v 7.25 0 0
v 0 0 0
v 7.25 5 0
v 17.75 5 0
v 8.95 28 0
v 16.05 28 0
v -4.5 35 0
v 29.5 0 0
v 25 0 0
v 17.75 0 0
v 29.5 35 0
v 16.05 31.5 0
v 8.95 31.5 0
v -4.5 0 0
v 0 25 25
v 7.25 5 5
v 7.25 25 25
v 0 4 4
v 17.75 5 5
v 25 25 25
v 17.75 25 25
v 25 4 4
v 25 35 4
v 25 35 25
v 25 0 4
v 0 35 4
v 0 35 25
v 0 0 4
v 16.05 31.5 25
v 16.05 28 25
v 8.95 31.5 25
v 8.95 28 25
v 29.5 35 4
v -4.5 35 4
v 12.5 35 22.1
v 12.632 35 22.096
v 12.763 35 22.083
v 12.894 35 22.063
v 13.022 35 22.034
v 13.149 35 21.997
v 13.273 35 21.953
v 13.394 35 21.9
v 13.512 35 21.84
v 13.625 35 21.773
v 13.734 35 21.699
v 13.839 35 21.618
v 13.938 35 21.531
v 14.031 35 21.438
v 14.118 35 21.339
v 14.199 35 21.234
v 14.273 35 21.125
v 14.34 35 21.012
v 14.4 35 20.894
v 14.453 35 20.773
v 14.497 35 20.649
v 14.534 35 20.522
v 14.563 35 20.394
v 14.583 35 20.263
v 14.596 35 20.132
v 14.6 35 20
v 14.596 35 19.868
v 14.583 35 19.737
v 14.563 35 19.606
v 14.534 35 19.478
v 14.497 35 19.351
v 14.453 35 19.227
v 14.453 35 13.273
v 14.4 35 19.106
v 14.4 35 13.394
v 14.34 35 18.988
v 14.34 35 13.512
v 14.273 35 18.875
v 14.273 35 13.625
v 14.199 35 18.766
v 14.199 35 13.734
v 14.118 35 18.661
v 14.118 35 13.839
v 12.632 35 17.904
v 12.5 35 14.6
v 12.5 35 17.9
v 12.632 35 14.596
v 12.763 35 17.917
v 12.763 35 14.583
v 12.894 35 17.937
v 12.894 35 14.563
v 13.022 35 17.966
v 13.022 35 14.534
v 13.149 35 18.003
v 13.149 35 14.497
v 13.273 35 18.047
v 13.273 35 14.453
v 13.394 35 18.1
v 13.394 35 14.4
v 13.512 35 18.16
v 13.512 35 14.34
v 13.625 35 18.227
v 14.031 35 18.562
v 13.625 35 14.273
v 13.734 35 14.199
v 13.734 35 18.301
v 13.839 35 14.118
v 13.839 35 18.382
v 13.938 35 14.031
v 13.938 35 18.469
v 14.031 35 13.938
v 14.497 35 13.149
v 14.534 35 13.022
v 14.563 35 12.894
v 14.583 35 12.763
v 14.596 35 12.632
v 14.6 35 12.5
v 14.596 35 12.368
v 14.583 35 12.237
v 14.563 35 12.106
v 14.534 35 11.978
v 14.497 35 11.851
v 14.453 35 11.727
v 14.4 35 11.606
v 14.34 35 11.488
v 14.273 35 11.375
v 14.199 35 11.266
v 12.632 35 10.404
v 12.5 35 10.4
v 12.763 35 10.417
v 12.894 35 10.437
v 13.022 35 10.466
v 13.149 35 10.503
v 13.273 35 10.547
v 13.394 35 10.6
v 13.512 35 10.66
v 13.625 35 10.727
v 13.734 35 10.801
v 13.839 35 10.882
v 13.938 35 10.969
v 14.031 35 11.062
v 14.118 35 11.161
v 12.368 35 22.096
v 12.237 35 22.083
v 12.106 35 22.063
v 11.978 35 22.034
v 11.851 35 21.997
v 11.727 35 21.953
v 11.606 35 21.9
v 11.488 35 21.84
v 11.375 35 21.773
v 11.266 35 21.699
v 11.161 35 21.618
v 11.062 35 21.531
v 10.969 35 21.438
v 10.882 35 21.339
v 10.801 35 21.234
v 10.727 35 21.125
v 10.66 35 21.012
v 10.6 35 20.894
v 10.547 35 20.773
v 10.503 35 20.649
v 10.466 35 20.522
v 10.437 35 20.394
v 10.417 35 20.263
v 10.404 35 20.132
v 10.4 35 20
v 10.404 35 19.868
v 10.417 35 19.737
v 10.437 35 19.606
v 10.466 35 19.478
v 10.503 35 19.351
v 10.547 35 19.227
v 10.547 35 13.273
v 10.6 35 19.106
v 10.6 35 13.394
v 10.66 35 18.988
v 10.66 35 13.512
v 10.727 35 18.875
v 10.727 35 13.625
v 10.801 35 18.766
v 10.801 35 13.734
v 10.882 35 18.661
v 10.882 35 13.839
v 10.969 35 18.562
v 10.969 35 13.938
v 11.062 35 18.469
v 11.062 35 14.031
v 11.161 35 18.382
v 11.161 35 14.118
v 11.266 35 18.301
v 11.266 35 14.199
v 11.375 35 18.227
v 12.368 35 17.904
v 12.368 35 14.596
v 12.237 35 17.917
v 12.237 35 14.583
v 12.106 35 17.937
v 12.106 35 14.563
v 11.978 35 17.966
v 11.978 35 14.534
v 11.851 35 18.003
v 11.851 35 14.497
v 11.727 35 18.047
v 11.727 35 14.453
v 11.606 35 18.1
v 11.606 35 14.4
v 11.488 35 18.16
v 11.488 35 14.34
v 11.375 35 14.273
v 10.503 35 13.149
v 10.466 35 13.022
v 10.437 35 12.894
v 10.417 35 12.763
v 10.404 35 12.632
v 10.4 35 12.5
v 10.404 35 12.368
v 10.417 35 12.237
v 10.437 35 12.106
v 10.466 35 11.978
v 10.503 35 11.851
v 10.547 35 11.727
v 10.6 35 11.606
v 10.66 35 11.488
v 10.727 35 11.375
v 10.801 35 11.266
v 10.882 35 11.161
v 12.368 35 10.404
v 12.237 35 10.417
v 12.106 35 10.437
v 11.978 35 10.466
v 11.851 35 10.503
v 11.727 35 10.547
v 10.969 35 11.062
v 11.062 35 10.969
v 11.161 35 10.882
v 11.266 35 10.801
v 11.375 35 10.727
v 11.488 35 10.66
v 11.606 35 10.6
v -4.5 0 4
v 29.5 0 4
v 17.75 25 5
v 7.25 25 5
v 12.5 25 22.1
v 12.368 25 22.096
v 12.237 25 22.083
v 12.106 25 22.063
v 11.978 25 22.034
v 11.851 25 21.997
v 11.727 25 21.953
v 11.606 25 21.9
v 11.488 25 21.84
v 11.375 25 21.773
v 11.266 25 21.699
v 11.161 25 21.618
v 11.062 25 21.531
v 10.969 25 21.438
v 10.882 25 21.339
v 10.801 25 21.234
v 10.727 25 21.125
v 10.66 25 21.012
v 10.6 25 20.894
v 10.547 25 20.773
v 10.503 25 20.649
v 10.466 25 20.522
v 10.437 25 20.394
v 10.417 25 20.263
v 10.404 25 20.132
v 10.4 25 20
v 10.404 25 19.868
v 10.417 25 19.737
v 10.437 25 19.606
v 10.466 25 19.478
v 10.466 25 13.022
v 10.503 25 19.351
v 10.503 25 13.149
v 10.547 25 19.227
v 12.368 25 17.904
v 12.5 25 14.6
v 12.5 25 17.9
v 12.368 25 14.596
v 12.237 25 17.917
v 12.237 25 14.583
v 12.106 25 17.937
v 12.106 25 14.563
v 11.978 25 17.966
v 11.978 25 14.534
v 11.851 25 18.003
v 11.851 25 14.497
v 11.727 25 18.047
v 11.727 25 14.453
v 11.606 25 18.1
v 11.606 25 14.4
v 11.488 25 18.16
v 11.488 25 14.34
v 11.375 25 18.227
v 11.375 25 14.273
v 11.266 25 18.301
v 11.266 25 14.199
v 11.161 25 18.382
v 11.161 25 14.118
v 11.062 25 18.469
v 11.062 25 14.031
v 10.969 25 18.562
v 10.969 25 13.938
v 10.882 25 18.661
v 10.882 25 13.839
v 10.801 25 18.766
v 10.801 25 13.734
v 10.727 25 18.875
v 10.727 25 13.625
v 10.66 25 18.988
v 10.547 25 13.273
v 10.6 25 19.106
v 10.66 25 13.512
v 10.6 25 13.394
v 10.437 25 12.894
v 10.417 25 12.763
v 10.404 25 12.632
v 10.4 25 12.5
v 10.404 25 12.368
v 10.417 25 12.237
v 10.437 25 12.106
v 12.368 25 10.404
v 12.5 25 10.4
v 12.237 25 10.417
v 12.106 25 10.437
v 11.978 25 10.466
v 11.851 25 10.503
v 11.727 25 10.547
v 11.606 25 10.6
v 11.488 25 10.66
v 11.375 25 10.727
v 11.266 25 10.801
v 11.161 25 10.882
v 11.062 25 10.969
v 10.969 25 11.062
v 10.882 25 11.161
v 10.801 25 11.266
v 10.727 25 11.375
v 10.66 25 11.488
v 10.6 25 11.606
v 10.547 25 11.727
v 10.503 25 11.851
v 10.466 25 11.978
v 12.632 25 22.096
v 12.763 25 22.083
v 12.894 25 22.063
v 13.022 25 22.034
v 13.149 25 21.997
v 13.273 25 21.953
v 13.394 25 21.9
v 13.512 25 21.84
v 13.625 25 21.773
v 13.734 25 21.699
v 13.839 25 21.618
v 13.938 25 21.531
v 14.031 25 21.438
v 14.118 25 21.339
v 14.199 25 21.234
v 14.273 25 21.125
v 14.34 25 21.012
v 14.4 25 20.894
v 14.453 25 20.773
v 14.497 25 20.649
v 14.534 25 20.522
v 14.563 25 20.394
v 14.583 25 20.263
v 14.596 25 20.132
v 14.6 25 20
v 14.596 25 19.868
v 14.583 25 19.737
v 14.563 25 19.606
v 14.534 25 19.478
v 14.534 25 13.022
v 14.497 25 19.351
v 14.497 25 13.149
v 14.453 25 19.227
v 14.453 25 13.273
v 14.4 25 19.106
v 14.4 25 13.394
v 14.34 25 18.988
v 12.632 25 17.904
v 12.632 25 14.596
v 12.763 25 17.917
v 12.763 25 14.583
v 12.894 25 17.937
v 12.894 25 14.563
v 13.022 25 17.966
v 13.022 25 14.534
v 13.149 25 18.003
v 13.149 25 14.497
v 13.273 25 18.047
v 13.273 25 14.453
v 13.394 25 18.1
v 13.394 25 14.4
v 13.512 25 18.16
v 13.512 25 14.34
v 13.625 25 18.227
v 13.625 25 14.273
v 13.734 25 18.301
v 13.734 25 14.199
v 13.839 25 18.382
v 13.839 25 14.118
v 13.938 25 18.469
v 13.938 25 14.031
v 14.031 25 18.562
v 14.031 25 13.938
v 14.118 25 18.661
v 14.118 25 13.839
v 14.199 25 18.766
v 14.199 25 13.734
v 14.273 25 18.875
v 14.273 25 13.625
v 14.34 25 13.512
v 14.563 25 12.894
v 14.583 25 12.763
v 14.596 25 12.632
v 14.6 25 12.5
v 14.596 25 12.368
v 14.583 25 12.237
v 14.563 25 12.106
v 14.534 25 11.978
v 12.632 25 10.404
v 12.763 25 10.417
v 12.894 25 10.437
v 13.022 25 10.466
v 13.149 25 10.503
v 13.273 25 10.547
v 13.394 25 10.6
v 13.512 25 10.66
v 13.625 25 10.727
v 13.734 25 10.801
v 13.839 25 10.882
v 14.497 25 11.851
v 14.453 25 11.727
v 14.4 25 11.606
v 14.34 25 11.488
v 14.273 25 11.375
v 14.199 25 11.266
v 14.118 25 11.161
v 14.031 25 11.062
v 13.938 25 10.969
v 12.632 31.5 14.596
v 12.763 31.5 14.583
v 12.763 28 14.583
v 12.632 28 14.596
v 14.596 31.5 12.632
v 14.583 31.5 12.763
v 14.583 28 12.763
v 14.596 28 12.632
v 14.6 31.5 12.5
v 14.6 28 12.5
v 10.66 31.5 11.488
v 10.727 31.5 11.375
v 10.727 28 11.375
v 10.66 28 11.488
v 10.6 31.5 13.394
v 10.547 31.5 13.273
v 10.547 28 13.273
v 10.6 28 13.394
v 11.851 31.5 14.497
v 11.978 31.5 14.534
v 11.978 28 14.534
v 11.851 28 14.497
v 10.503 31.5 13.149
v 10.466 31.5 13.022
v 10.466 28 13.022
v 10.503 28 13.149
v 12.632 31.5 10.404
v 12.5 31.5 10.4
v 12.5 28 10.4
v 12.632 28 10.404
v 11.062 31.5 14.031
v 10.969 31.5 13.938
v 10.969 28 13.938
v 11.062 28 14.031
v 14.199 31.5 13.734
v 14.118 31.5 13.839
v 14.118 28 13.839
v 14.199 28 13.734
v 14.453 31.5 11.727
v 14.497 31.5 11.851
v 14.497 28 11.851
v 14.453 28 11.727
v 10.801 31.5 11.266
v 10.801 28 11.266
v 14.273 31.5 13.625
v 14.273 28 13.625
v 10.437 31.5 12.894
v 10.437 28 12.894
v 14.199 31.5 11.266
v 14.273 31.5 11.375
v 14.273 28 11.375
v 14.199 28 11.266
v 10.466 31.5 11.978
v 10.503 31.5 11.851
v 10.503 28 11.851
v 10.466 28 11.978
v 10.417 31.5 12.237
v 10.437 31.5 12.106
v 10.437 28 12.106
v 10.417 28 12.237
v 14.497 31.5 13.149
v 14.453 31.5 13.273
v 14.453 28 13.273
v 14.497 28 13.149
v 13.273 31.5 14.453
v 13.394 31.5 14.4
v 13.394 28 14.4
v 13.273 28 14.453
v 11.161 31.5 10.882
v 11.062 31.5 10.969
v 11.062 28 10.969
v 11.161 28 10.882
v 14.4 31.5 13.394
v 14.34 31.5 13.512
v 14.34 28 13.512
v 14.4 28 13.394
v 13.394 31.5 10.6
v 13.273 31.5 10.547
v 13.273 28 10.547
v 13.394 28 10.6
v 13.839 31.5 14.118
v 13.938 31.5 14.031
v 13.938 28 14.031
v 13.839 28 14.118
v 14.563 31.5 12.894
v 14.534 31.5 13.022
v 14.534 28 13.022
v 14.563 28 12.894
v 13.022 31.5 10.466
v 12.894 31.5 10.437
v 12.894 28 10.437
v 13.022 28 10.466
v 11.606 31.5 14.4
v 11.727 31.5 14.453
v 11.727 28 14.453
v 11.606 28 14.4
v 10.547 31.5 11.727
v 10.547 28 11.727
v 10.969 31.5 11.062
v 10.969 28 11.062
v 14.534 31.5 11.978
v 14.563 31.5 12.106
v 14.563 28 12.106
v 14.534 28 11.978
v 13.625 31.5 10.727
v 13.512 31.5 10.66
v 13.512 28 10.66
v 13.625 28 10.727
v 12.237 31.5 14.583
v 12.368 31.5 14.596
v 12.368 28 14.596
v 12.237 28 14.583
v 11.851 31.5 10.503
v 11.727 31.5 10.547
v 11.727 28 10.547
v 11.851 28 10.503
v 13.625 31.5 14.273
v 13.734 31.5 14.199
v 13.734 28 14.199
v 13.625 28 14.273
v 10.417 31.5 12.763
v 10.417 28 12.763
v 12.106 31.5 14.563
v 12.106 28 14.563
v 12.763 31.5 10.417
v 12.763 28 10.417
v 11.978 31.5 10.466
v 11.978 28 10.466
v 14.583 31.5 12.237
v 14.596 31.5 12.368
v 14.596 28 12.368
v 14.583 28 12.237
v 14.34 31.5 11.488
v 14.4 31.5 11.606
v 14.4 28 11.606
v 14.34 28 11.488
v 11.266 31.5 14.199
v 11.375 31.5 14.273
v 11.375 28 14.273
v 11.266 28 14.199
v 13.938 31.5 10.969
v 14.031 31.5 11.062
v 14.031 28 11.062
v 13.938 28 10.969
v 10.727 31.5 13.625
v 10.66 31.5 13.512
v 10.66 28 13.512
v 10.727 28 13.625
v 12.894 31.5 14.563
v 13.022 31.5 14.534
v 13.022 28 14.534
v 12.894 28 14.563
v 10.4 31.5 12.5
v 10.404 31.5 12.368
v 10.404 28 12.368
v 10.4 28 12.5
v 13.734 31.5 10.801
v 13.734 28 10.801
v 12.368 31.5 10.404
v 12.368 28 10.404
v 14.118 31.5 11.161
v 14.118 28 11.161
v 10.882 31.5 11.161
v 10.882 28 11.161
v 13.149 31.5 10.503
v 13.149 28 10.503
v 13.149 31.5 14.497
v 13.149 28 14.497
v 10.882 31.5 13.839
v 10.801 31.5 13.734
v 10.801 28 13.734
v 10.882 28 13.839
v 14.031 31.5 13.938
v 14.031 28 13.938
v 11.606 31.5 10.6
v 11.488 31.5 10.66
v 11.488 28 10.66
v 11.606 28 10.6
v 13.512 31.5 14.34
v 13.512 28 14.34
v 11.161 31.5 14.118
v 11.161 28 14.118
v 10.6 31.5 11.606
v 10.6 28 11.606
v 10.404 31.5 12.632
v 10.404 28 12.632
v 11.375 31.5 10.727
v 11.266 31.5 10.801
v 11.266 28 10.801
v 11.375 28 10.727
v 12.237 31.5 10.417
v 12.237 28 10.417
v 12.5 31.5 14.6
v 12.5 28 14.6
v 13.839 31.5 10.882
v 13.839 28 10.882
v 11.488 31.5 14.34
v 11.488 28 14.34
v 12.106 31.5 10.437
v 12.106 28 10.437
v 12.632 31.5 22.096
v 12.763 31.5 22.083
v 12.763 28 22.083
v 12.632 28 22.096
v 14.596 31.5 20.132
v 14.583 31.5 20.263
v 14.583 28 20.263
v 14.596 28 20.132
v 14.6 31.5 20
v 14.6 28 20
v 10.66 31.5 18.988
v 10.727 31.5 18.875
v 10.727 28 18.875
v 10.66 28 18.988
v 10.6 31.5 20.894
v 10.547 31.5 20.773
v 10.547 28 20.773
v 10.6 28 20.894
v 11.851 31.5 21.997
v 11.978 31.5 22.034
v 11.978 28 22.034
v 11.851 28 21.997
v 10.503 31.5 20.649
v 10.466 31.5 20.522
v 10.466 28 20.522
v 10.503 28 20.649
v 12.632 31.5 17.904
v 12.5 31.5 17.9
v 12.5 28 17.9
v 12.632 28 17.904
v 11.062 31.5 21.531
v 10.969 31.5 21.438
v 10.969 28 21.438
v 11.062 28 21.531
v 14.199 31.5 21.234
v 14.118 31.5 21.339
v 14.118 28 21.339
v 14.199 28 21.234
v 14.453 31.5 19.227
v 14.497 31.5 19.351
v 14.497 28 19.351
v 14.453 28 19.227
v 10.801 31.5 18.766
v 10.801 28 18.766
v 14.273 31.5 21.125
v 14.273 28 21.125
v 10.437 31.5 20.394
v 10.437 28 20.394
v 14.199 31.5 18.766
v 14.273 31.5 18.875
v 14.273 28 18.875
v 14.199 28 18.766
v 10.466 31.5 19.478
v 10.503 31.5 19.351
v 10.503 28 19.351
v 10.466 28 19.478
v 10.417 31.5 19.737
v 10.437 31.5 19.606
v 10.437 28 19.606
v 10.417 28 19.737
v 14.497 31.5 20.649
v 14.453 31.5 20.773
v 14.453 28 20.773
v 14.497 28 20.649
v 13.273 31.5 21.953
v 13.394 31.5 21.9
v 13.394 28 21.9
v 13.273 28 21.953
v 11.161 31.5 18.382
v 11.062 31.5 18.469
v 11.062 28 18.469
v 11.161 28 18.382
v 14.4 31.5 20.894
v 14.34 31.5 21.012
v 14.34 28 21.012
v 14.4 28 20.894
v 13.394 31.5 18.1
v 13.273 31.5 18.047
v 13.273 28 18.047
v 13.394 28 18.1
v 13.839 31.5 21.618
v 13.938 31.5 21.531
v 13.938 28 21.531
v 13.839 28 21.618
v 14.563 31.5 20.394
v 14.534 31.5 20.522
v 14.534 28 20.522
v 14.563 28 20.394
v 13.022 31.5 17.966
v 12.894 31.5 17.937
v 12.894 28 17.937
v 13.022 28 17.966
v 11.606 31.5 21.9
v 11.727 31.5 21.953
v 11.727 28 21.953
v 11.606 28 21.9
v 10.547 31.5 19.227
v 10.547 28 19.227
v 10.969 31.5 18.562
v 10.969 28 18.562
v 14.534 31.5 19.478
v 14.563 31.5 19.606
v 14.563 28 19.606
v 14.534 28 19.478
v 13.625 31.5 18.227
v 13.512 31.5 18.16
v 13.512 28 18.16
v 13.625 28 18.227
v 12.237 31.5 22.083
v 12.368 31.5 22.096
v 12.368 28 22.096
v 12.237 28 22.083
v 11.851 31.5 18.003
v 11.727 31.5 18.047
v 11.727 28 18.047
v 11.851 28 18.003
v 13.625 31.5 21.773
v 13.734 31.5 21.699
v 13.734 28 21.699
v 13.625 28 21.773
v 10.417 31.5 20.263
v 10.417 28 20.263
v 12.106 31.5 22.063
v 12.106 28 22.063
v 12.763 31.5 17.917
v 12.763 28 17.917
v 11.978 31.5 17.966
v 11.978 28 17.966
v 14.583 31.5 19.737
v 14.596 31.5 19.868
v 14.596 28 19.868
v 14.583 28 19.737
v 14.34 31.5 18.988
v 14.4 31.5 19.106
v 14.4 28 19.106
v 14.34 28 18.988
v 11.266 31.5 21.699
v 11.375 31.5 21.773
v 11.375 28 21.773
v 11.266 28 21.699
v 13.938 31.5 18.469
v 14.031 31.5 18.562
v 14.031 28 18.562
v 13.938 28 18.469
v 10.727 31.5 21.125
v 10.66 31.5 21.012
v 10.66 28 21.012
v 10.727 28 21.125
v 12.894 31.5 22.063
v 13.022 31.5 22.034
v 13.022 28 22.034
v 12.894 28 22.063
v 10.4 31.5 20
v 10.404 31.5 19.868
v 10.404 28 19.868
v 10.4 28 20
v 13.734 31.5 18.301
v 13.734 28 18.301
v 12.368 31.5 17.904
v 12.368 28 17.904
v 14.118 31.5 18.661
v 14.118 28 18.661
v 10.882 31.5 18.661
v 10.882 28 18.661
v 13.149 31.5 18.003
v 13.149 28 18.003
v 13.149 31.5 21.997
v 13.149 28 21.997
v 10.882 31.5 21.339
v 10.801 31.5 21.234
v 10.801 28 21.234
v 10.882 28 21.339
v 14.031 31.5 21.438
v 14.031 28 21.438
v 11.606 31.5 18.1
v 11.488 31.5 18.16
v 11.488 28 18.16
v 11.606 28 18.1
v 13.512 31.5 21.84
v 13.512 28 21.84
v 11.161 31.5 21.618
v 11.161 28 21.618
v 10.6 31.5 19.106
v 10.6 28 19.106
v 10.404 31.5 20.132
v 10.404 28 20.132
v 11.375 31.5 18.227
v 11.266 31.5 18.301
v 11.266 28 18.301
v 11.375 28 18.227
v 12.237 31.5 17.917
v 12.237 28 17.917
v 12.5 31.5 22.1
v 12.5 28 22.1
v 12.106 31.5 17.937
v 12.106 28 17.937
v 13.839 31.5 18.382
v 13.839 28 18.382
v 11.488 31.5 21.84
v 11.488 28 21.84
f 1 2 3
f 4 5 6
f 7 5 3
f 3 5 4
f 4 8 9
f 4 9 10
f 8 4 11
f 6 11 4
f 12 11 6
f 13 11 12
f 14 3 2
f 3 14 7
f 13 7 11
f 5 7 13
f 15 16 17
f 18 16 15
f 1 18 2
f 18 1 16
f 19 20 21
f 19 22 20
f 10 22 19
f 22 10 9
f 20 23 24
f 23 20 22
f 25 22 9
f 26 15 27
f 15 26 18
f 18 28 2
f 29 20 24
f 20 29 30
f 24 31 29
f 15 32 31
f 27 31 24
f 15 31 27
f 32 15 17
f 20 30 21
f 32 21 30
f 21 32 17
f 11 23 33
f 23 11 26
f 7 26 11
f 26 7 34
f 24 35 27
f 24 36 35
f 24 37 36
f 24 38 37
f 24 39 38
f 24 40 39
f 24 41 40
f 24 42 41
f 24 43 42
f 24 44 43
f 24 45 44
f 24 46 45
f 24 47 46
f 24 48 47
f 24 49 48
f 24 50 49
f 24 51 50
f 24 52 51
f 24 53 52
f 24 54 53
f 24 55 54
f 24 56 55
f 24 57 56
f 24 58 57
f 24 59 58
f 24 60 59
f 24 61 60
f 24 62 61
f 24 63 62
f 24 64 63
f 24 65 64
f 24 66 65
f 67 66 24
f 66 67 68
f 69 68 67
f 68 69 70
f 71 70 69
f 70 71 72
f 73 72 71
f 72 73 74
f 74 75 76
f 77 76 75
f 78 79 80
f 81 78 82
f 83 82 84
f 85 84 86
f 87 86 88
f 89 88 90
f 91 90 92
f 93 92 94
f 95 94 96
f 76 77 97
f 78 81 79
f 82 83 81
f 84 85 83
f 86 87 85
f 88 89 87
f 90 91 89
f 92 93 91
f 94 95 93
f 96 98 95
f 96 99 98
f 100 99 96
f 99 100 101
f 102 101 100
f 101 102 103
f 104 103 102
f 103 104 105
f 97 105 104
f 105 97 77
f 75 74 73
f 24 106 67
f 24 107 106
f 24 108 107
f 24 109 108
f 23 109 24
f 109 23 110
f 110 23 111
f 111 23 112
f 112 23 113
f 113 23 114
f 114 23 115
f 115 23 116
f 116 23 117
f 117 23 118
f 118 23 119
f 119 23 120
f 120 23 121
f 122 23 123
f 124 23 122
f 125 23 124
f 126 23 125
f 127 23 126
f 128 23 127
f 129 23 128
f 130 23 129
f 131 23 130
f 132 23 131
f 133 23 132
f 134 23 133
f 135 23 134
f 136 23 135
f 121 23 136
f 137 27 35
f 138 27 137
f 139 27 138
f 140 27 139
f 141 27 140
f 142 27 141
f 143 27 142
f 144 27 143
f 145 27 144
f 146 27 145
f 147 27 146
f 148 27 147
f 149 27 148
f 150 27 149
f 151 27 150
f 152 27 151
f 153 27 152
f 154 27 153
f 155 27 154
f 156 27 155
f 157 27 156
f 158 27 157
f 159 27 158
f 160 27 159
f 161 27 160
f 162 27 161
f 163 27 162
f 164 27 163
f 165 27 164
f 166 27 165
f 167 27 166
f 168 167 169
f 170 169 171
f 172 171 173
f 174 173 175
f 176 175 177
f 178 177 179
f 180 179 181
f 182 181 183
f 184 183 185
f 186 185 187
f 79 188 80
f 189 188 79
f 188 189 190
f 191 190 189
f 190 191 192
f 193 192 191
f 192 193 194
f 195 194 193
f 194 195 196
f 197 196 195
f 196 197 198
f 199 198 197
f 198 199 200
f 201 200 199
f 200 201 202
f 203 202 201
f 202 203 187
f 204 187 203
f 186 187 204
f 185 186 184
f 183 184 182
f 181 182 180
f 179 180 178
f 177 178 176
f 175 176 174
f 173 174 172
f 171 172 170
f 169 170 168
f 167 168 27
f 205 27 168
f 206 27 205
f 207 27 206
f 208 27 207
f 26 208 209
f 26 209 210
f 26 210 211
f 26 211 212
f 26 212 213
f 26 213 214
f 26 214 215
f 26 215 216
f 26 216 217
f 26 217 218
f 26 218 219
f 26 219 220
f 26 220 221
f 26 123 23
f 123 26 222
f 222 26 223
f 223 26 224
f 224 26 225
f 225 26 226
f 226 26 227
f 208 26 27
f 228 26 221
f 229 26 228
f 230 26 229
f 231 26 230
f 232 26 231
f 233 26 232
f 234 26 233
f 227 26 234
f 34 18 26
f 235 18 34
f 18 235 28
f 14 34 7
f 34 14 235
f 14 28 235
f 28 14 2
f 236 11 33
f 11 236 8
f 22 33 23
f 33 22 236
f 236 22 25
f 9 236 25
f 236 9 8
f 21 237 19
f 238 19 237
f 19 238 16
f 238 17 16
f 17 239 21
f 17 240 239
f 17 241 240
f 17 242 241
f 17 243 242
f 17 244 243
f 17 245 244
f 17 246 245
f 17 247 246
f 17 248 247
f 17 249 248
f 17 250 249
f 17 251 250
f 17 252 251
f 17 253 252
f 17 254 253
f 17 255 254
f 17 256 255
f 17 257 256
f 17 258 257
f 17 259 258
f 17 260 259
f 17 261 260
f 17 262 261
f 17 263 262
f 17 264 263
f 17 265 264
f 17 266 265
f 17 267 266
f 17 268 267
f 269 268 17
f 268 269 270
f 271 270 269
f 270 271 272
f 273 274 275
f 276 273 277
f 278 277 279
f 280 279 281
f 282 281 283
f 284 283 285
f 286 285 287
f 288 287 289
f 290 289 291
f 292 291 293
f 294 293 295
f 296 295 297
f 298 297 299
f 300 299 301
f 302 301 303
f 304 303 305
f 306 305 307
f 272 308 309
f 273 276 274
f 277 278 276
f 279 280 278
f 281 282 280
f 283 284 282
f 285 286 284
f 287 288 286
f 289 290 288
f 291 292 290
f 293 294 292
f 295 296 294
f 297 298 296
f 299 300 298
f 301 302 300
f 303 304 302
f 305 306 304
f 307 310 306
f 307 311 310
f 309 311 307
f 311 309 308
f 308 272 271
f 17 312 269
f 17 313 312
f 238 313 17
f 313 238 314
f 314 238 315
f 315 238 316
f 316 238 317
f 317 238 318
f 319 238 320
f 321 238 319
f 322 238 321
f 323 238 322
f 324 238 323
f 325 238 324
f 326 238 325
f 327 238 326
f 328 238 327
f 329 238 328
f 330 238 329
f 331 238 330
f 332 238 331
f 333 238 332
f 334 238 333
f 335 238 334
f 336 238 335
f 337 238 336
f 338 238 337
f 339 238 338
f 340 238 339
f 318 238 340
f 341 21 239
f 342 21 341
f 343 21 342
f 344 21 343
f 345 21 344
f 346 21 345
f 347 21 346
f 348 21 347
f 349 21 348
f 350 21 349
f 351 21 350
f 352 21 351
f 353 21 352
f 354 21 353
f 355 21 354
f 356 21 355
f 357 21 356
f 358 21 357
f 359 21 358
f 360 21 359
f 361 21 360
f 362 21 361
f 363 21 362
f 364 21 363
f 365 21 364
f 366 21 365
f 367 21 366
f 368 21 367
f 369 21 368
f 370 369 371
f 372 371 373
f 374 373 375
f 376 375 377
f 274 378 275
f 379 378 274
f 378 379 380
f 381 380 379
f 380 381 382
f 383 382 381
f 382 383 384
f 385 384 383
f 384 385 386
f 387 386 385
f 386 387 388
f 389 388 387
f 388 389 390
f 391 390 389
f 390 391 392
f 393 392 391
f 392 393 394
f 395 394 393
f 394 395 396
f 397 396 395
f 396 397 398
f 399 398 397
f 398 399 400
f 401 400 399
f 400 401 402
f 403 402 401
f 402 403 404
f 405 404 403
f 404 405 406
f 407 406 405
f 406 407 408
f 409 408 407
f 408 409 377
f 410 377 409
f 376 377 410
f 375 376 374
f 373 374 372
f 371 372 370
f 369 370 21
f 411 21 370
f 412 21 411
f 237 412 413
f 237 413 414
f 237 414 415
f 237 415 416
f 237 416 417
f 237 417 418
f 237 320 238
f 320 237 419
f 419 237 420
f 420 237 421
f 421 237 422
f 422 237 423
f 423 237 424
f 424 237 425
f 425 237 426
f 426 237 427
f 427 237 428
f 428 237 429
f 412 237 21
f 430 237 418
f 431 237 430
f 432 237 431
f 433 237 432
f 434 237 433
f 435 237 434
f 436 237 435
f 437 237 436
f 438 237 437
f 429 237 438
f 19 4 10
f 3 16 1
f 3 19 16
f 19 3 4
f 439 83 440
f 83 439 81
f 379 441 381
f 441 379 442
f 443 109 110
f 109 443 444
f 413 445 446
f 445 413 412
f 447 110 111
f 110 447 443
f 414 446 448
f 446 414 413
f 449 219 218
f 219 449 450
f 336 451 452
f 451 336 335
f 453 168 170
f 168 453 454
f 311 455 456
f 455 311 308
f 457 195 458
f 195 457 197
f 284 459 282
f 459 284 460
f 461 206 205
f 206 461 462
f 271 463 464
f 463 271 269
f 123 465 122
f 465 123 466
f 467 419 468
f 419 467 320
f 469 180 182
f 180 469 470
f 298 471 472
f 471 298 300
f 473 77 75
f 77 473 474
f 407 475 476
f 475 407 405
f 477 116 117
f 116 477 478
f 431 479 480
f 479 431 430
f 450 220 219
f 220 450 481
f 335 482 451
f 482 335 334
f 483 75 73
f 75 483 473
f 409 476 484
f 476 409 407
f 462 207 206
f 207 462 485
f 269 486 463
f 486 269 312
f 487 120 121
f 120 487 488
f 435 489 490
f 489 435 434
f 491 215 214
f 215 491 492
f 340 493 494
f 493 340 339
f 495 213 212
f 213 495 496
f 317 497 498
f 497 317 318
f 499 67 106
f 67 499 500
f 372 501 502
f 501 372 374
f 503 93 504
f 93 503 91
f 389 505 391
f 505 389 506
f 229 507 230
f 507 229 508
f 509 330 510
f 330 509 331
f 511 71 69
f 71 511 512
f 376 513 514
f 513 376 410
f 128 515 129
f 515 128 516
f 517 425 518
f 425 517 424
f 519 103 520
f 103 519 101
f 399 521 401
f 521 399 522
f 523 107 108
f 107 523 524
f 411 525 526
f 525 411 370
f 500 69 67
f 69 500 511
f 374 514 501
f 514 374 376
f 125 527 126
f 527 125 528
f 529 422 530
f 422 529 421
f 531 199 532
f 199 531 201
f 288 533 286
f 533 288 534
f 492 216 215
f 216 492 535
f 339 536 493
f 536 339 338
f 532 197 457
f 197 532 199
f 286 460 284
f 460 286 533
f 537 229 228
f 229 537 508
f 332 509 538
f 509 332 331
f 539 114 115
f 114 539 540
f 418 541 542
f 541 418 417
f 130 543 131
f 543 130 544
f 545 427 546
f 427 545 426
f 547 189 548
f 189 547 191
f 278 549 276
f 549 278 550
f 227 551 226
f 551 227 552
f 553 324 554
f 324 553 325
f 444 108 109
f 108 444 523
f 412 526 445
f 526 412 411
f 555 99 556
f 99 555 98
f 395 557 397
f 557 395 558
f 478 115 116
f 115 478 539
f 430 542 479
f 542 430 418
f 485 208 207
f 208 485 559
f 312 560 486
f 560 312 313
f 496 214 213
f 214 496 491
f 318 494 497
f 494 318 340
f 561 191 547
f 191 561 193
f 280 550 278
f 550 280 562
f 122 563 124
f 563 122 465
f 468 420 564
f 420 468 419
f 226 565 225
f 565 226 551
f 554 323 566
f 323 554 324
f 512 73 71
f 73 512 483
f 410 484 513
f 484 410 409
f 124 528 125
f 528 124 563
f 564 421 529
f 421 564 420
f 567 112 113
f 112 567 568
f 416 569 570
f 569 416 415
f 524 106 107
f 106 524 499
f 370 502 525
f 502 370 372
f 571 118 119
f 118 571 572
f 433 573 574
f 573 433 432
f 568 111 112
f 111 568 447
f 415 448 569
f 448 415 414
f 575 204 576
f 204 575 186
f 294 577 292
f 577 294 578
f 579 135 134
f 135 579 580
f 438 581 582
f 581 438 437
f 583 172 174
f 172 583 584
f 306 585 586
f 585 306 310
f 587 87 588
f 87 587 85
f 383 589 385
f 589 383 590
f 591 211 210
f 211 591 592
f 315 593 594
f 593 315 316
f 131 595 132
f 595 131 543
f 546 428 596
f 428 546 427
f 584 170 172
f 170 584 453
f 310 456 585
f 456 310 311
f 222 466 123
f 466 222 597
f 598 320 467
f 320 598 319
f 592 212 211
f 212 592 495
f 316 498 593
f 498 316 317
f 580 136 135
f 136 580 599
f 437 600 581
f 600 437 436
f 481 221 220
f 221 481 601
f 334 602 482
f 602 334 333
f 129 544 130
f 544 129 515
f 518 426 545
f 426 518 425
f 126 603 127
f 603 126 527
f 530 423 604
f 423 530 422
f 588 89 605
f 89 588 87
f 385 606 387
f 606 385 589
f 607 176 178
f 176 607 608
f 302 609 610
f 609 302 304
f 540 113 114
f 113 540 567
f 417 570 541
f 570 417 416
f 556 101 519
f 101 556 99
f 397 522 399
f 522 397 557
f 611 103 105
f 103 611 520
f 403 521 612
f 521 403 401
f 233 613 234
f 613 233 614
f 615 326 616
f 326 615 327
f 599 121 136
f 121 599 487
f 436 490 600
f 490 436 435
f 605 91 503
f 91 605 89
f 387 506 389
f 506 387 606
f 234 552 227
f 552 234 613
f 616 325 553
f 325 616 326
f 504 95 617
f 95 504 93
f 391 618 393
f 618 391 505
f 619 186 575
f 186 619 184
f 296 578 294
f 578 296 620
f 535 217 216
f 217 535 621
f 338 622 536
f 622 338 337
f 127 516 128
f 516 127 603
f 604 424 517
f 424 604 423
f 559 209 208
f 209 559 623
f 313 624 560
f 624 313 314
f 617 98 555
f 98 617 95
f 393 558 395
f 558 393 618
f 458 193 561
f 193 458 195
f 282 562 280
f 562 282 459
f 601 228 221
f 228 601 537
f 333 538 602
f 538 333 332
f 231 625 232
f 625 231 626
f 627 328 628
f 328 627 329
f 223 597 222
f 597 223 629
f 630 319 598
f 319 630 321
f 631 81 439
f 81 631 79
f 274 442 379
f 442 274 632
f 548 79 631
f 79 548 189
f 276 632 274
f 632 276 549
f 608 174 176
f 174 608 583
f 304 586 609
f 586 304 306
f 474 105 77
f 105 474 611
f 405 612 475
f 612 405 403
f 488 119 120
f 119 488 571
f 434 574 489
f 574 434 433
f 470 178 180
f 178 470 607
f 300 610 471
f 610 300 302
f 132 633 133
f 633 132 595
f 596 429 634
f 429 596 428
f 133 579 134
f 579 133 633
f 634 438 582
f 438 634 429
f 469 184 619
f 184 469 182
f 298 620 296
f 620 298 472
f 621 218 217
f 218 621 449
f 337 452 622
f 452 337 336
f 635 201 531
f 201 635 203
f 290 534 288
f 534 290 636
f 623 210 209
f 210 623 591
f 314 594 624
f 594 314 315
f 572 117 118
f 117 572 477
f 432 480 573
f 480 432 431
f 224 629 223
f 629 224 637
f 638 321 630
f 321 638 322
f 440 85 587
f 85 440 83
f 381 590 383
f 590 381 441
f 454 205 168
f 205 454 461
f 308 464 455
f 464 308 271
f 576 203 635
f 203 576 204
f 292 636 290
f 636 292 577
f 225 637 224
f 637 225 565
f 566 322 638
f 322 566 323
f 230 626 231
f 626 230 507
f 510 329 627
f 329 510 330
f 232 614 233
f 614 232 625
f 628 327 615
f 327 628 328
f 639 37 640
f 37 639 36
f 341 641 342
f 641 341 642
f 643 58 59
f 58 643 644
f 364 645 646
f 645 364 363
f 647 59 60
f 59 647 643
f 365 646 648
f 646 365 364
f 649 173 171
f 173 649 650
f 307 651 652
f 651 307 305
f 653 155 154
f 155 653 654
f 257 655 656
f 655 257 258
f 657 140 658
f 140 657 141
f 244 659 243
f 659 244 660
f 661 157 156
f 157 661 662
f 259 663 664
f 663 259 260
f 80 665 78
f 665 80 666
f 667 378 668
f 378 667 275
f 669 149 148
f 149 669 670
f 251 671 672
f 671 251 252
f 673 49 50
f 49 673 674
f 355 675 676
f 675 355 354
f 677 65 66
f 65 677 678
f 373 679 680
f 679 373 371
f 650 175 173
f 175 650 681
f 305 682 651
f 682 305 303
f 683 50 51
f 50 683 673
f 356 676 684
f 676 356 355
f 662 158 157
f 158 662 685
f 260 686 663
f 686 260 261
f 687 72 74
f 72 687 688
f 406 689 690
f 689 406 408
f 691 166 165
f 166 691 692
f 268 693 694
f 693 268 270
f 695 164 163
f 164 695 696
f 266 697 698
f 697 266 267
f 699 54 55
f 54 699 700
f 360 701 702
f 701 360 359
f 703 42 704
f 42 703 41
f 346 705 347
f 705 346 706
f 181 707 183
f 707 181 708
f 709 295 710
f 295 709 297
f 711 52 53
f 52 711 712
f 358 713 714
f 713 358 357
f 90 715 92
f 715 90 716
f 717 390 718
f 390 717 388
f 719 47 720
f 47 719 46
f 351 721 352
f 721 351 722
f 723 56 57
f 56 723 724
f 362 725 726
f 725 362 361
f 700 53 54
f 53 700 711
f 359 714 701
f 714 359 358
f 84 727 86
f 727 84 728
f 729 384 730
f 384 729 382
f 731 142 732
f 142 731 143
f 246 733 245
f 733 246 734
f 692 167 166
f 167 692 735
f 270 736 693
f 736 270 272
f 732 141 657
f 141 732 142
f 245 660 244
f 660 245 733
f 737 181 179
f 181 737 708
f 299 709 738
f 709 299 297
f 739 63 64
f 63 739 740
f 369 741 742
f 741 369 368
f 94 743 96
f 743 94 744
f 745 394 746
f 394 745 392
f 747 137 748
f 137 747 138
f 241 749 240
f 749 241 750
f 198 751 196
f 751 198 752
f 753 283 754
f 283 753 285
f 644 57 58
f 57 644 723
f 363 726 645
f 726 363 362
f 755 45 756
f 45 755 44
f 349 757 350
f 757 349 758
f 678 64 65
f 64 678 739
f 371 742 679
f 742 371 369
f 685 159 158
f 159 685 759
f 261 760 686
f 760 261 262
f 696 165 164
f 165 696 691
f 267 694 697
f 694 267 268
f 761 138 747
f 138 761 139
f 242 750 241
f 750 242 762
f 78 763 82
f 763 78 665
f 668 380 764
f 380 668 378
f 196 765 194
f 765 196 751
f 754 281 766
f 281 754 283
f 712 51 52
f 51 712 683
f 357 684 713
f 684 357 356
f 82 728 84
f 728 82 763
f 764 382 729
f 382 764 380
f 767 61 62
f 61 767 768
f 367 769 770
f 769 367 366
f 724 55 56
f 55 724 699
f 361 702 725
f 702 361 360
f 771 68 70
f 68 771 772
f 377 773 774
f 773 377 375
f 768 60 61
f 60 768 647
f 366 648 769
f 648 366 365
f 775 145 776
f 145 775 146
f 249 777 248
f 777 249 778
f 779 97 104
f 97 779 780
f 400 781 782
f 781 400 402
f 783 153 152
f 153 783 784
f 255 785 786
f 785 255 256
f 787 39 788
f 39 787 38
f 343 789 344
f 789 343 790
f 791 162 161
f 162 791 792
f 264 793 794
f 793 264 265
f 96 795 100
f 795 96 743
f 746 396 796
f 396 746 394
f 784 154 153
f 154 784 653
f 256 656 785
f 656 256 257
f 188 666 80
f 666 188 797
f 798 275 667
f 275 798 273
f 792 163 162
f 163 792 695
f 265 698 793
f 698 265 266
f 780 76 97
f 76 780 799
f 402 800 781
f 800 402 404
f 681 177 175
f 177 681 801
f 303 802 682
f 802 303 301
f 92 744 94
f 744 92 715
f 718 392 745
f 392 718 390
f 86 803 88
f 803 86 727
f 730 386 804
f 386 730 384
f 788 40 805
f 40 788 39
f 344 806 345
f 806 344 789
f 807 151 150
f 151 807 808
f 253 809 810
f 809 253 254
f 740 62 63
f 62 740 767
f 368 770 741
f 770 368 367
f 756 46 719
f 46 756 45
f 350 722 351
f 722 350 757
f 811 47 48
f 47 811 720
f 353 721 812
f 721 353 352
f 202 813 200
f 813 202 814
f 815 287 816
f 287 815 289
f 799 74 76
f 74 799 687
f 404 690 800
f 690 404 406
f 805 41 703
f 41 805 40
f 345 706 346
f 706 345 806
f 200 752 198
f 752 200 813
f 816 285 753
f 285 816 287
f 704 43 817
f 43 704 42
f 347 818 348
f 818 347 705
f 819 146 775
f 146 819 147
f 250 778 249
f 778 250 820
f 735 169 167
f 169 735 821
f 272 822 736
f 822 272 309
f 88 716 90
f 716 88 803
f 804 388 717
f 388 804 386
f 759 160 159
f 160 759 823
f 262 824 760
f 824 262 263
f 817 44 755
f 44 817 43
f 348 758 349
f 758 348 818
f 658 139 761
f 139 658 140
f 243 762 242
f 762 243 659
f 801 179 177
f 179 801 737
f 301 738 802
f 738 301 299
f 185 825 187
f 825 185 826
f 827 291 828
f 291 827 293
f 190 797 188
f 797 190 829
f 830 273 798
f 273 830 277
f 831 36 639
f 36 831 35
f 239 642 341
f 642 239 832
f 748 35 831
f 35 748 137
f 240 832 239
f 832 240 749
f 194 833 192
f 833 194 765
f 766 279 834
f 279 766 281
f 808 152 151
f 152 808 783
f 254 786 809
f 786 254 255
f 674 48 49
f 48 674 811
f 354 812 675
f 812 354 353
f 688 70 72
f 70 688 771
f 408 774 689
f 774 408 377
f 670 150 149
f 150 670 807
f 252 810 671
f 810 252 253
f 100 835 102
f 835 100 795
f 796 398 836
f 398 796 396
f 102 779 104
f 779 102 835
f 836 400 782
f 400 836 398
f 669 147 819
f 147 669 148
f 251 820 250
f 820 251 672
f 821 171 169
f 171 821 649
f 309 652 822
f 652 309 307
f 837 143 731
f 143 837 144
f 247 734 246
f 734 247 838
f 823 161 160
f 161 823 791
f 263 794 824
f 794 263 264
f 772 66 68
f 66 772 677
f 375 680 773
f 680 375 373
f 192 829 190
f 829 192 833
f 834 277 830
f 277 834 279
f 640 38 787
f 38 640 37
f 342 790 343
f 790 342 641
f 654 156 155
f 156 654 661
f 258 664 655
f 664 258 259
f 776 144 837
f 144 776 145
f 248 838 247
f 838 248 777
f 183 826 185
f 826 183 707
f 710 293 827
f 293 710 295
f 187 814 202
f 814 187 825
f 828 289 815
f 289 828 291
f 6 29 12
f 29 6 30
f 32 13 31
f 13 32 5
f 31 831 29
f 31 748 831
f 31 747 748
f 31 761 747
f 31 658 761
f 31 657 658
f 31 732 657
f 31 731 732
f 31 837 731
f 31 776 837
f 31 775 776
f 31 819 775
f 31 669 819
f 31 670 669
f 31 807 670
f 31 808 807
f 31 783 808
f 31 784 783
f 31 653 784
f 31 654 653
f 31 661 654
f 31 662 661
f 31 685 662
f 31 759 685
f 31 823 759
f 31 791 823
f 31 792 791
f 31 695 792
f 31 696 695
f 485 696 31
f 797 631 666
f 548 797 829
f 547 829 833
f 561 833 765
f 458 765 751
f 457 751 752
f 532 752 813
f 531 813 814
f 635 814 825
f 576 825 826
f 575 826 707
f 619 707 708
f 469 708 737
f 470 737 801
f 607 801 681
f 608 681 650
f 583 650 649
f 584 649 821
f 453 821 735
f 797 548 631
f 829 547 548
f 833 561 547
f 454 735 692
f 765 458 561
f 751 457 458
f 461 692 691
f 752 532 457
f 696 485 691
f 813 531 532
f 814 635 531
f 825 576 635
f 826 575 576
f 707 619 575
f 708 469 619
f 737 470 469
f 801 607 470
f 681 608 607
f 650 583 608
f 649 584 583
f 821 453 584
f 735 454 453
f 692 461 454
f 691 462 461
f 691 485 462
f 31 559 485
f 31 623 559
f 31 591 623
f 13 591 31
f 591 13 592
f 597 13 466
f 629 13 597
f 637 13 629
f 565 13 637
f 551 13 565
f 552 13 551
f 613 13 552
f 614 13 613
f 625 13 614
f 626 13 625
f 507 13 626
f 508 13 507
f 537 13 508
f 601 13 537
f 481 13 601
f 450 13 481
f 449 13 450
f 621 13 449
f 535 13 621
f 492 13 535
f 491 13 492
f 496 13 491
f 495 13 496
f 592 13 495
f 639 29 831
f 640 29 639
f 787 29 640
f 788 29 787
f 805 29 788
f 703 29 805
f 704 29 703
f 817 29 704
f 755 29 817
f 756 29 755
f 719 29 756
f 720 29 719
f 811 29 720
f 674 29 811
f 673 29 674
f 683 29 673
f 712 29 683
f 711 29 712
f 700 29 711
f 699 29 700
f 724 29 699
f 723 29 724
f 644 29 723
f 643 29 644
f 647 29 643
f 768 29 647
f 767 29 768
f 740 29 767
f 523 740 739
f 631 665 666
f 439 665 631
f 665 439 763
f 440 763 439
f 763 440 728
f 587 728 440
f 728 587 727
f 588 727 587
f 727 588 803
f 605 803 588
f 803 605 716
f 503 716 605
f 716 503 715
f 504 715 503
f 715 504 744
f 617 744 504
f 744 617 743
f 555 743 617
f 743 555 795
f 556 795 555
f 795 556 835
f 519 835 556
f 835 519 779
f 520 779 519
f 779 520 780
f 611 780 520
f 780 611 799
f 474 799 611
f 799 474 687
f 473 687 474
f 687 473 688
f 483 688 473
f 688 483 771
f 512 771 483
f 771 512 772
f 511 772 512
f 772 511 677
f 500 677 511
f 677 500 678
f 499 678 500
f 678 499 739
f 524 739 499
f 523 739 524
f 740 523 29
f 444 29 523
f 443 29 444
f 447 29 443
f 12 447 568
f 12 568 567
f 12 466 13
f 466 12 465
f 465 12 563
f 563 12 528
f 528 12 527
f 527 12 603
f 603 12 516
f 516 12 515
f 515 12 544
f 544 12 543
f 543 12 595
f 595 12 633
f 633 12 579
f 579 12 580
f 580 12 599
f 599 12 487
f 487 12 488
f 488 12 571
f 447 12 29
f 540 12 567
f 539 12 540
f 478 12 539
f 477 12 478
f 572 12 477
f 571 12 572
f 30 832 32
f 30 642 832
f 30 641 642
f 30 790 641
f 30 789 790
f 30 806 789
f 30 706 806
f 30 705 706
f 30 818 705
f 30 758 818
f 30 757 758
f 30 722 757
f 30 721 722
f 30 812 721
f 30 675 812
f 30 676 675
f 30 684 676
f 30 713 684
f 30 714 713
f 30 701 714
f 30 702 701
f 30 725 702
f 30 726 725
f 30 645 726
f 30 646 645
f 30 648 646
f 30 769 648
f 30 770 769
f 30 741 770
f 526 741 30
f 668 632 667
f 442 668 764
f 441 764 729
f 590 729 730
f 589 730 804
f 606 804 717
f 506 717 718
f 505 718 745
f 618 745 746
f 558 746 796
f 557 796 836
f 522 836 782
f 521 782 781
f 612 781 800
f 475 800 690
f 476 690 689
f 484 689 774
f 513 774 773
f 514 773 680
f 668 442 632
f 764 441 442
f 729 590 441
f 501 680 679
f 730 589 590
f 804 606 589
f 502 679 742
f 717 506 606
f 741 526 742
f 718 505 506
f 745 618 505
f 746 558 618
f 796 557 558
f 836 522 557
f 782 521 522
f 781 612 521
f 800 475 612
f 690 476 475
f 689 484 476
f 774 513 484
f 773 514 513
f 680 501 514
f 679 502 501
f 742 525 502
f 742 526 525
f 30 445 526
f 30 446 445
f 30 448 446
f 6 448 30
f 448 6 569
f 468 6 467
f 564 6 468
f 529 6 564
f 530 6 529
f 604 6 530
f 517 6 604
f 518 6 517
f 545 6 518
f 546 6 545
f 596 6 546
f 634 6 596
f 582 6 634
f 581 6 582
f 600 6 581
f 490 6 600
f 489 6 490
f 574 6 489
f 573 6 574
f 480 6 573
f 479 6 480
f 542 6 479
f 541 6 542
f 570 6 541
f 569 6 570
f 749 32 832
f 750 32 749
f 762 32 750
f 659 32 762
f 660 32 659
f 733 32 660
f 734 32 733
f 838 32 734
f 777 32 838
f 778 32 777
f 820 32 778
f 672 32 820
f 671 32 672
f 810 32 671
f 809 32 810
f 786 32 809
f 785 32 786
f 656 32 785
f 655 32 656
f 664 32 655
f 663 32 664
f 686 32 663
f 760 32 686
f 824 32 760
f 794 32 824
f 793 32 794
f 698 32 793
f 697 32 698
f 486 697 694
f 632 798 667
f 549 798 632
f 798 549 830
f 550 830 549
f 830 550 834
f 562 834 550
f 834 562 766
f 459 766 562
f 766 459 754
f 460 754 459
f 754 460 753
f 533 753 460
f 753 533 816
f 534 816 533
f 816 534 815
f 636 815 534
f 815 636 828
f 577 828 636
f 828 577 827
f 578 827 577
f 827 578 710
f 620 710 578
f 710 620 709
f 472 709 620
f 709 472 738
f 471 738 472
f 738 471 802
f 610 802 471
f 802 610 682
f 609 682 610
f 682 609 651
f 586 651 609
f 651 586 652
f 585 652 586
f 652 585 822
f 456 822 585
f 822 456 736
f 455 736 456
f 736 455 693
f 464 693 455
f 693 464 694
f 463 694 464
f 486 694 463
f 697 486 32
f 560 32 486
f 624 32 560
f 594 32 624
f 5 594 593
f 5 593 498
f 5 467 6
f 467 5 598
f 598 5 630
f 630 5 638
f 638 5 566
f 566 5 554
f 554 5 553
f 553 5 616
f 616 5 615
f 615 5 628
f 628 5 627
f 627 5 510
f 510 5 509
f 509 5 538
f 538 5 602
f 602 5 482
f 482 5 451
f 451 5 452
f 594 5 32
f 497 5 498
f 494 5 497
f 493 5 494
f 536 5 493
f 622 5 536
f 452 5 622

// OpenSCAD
module prism(l, w, h){
      polyhedron(//pt 0        1        2        3        4        5
              points=[[0,0,0], [l,0,0], [l,w,0], [0,w,0], [0,w,h], [l,w,h]],
              faces=[[0,1,2,3],[5,4,3,2],[0,4,5,1],[0,3,4],[5,2,1]]
              );
}
      
rail_guide_width = 4.5;
rail_guide_height = 4;
central_notch_width = 10.5;

// m4 screw
screw_width_free_rotation = 4.2;

// m4 nut
nut_width = 7.1;
nut_height = 3.5;

difference(){
    union(){
        // movable wedge
        prism(25, 25, 25);
        // backing cube
        translate([0, 25, 0]) {
            cube([25, 10, 25]);
        }
        // wing notches to slide in rails
        translate([-rail_guide_width, 0, 0]){
            cube([rail_guide_width, 35, rail_guide_height]);
        }
        translate([25, 0, 0]){
            cube([rail_guide_width, 35, rail_guide_height]);
        }
    }
    // cutout for oposite side
    translate([(25-central_notch_width)/2, 0, 5]){
        cube([central_notch_width, 25, 25]);
    }
    translate([(25-central_notch_width)/2, -20, -0.1]){
        cube([central_notch_width, 25, 25.1]);
    }
    // m4 screw hole - pull
    translate([25/2, 50, 25/2]) {
        rotate([90, 0, 0]) {
            cylinder(d=screw_width_free_rotation, h=50, $fn=100);
        }
    }
    // m4 screw hole - push
    translate([25/2, 50, 20]) {
        rotate([90, 0, 0]) {
            cylinder(d=screw_width_free_rotation, h=50, $fn=100);
        }
    }
    
    // m4 nut hole
    translate([25/2-nut_width/2, 28, -5]) {
        rotate([0, 0, 0]){
            cube([nut_width, nut_height, 50]);
        }
    }    

    
}


                
